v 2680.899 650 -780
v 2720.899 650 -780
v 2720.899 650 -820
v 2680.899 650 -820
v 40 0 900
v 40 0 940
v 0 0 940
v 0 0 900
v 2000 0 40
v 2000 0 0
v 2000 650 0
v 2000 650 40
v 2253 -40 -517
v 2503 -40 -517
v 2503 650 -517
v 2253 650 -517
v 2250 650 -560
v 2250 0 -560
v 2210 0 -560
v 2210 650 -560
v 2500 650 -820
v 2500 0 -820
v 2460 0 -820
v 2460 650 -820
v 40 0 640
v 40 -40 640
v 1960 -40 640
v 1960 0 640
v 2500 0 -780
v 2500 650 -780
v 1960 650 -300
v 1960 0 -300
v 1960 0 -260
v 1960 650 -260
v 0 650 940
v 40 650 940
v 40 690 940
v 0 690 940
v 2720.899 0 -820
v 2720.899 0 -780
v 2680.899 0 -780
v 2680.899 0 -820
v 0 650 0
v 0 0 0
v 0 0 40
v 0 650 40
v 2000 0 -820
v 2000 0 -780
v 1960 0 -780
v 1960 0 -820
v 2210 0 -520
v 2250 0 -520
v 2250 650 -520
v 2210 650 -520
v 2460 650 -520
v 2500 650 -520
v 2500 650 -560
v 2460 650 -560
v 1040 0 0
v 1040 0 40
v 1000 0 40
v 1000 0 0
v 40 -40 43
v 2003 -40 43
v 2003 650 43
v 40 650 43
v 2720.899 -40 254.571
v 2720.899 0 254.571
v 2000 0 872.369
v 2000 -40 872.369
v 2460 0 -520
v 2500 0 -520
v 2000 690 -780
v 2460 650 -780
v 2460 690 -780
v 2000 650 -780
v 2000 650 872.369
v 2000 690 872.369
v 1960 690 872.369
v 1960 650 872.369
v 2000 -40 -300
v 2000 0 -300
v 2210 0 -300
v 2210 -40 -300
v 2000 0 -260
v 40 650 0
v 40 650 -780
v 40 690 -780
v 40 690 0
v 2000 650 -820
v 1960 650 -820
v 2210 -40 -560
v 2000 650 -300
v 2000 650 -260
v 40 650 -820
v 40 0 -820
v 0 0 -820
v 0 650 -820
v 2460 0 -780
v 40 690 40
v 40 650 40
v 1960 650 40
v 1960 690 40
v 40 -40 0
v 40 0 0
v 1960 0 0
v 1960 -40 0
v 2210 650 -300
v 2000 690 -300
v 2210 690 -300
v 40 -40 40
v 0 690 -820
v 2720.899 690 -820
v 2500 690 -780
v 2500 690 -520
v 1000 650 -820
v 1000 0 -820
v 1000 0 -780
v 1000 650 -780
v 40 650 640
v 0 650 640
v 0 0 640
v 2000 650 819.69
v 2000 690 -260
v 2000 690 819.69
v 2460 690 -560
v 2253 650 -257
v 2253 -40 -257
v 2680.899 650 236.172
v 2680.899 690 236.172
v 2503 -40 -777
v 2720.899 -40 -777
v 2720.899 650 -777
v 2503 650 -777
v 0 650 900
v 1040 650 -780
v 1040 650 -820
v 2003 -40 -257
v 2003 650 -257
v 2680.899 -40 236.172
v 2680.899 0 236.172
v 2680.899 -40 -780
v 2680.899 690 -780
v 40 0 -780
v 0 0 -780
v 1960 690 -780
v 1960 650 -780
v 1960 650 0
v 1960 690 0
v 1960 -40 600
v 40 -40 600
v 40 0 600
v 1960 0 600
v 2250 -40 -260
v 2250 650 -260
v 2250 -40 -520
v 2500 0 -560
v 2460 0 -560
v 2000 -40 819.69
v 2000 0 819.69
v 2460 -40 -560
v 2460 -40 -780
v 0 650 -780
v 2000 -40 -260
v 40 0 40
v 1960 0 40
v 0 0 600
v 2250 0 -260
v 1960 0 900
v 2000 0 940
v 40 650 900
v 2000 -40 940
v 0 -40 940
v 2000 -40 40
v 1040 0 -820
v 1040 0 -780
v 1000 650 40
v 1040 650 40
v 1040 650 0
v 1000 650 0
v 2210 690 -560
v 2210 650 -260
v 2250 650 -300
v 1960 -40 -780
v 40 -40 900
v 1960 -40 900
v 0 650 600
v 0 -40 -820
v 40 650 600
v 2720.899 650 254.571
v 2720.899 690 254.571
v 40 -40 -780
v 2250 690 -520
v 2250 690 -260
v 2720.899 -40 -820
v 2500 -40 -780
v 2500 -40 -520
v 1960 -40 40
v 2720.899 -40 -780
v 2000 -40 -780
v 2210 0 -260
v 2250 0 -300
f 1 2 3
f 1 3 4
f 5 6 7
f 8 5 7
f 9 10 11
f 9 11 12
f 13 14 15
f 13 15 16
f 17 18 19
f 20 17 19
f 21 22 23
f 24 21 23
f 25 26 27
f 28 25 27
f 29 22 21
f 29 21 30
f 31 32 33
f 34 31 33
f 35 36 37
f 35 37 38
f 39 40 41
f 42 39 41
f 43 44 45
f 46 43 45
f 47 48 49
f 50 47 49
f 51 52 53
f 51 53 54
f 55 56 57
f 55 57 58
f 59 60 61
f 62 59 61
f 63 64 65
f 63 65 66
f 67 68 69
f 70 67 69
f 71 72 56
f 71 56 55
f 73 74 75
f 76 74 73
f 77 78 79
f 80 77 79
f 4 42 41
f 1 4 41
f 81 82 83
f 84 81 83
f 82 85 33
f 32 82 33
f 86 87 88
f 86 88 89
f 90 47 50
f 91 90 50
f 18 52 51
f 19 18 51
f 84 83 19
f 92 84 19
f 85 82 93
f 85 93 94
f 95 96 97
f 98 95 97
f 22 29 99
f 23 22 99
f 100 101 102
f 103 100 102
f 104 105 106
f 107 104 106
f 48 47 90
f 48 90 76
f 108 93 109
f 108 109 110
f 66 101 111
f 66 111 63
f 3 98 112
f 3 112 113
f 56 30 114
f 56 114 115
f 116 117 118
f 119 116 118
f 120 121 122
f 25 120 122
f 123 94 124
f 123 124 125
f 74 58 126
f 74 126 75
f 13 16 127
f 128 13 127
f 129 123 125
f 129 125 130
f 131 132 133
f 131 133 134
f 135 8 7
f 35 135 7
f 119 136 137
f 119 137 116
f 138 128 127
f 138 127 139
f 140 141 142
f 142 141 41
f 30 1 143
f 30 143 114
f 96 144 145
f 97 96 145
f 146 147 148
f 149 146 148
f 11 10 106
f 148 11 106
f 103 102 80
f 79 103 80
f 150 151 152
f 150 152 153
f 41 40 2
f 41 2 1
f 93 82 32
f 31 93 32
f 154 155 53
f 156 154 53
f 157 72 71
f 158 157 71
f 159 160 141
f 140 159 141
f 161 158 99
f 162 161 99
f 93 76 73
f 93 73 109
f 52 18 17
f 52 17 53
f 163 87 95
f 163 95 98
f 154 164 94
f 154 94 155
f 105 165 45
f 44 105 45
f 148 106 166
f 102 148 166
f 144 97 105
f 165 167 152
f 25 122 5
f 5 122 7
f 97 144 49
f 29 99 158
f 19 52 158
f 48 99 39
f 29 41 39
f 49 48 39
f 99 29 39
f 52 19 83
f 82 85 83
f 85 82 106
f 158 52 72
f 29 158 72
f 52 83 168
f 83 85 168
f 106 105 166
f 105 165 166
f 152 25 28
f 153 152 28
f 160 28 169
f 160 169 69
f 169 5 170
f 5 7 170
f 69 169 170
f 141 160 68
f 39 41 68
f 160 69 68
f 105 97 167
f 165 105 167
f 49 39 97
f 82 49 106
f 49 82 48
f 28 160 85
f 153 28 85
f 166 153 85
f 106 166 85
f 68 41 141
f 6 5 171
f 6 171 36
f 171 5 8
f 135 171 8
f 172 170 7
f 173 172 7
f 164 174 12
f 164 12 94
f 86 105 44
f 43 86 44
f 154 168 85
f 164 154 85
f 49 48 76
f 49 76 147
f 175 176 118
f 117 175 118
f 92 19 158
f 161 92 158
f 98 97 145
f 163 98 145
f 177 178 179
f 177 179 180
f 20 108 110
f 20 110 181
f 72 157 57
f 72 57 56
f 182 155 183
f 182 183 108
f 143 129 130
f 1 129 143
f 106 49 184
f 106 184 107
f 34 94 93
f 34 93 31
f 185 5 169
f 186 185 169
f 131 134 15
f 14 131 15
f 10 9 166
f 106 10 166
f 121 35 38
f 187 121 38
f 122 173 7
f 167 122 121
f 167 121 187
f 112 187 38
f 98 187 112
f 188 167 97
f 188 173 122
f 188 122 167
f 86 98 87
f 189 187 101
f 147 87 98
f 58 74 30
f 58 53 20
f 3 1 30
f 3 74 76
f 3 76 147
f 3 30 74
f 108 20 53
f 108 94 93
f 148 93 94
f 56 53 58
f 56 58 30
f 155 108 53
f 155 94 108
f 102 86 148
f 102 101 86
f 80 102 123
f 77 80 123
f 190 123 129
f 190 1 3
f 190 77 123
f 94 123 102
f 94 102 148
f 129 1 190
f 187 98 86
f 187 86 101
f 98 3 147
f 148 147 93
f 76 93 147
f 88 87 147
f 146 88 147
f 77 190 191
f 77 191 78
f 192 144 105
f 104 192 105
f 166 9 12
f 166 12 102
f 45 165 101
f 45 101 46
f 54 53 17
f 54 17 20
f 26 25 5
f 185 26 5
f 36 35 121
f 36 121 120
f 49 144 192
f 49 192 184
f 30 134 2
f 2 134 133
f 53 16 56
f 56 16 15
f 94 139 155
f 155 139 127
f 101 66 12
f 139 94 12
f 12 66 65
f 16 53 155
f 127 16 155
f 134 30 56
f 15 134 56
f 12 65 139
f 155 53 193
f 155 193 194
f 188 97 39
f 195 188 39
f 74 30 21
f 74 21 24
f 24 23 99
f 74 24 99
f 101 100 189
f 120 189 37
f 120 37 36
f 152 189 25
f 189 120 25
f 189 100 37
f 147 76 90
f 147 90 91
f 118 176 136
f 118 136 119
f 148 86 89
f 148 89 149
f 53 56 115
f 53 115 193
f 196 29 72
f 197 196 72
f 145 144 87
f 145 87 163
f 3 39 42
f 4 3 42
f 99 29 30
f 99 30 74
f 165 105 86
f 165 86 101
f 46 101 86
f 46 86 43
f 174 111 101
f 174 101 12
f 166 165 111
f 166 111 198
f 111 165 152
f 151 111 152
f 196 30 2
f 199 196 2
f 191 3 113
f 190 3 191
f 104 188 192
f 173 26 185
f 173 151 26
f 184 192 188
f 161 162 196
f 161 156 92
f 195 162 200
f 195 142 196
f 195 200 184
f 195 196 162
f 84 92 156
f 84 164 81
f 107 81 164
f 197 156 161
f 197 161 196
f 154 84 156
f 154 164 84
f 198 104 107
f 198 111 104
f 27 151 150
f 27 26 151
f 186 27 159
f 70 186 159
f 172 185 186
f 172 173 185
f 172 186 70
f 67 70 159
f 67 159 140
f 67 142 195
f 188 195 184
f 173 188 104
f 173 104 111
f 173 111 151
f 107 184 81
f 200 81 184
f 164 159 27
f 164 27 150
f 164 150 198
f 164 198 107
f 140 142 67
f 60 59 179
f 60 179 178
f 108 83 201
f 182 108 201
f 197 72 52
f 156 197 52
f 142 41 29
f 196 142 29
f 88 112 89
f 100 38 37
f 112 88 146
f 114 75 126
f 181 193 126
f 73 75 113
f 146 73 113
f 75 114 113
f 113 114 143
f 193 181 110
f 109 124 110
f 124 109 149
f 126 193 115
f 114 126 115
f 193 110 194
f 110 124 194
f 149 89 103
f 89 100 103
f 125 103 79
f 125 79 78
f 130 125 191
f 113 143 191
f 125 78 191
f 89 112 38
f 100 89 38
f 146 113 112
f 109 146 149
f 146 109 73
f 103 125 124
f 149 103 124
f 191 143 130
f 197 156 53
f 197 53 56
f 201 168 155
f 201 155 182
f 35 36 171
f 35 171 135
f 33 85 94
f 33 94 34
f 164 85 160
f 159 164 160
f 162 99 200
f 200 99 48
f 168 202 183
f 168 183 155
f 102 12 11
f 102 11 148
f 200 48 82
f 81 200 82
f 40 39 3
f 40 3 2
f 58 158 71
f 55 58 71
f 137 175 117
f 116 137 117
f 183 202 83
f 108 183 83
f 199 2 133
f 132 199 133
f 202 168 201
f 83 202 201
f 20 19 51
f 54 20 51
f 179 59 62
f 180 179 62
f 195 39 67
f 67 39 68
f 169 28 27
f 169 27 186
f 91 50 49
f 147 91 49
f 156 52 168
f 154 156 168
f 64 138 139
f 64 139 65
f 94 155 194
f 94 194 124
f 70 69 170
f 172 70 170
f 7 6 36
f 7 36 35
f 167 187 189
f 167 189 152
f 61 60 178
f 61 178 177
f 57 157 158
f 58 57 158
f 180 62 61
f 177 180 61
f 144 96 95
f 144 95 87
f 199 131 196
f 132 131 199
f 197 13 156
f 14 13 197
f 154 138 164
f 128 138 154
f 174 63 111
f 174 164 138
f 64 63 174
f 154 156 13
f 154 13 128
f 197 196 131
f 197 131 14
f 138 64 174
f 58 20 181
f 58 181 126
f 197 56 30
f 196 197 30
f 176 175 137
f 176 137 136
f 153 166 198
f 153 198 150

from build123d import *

# Parameters (mm, degrees)
F0_W      = 1920
F0_H      = 780
F0_H_2    = 860
F1_DEPTH  = 40
F2_W      = 40
F2_H      = 40
F3_DEPTH  = 650
F6_W      = 1920
F6_H      = 3
F6_W_2    = 40
F7_DEPTH  = 690
F9_DEPTH  = 760
F10_W     = 1920
F10_H     = 40
F11_DEPTH = 40
F12_W     = 664.210498333
F12_H     = 40
F13_DEPTH = 40


with BuildPart() as f1:
    # F0 (on Front) → F1 (new body)
    with BuildSketch(Plane.XZ):
        Polygon((0, -820), (2000, -820), (2720.8986186981, -820), (2720.8986186981, 254.5713696399), (2000, 872.3691137475), (2000, 940), (0, 940), (0, 40), (0, 0), align=None)
        with Locations((1000, -390)):
            Rectangle(F0_W, F0_H, mode=Mode.SUBTRACT)
        Polygon((2460, -780), (2000, -780), (2000, -300), (2210, -300), (2210, -560), (2460, -560), align=None, mode=Mode.SUBTRACT)
        Polygon((2000, 0), (2000, 40), (2000, 819.6901679039), (2680.8986186981, 236.1717373133), (2680.8986186981, -780), (2500, -780), (2500, -520), (2250, -520), (2250, -260), (2000, -260), align=None, mode=Mode.SUBTRACT)
        with Locations((1000, 470)):
            Rectangle(F0_W, F0_H_2, mode=Mode.SUBTRACT)
    extrude(amount=F1_DEPTH)


with BuildPart() as f3:
    # F2 (on face) → F3 (new body)
    with BuildSketch(Plane(origin=(0, 0, 0), x_dir=(-1, 0, 0), z_dir=(0, 1, 0))):
        with Locations((-20, 920)):
            Rectangle(F2_W, F2_H)
    extrude(amount=F3_DEPTH)


with BuildPart() as f3b:
    # F2 (on face) → F3, piece 2 (new body)
    with BuildSketch(Plane(origin=(0, 0, 0), x_dir=(-1, 0, 0), z_dir=(0, 1, 0))):
        with Locations((-20, 20)):
            Rectangle(F2_W, F2_H)
    extrude(amount=F3_DEPTH)


with BuildPart() as f3c:
    # F2 (on face) → F3, piece 3 (new body)
    with BuildSketch(Plane(origin=(0, 0, 0), x_dir=(-1, 0, 0), z_dir=(0, 1, 0))):
        with Locations((-20, -800)):
            Rectangle(F2_W, F2_H)
    extrude(amount=F3_DEPTH)


with BuildPart() as f3d:
    # F2 (on face) → F3, piece 4 (new body)
    with BuildSketch(Plane(origin=(0, 0, 0), x_dir=(-1, 0, 0), z_dir=(0, 1, 0))):
        with Locations((-1020, -800)):
            Rectangle(F2_W, F2_H)
    extrude(amount=F3_DEPTH)


with BuildPart() as f3e:
    # F2 (on face) → F3, piece 5 (new body)
    with BuildSketch(Plane(origin=(0, 0, 0), x_dir=(-1, 0, 0), z_dir=(0, 1, 0))):
        with Locations((-1020, 20)):
            Rectangle(F2_W, F2_H)
    extrude(amount=F3_DEPTH)


with BuildPart() as f3f:
    # F2 (on face) → F3, piece 6 (new body)
    with BuildSketch(Plane(origin=(0, 0, 0), x_dir=(-1, 0, 0), z_dir=(0, 1, 0))):
        with Locations((-1980, 20)):
            Rectangle(F2_W, F2_H)
    extrude(amount=F3_DEPTH)


with BuildPart() as f3g:
    # F2 (on face) → F3, piece 7 (new body)
    with BuildSketch(Plane(origin=(0, 0, 0), x_dir=(-1, 0, 0), z_dir=(0, 1, 0))):
        with Locations((-1980, -800)):
            Rectangle(F2_W, F2_H)
    extrude(amount=F3_DEPTH)


with BuildPart() as f3h:
    # F2 (on face) → F3, piece 8 (new body)
    with BuildSketch(Plane(origin=(0, 0, 0), x_dir=(-1, 0, 0), z_dir=(0, 1, 0))):
        with Locations((-1980, -280)):
            Rectangle(F2_W, F2_H)
    extrude(amount=F3_DEPTH)


with BuildPart() as f3i:
    # F2 (on face) → F3, piece 9 (new body)
    with BuildSketch(Plane(origin=(0, 0, 0), x_dir=(-1, 0, 0), z_dir=(0, 1, 0))):
        with Locations((-2230, -280)):
            Rectangle(F2_W, F2_H)
    extrude(amount=F3_DEPTH)


with BuildPart() as f3j:
    # F2 (on face) → F3, piece 10 (new body)
    with BuildSketch(Plane(origin=(0, 0, 0), x_dir=(-1, 0, 0), z_dir=(0, 1, 0))):
        with Locations((-2480, -540)):
            Rectangle(F2_W, F2_H)
    extrude(amount=F3_DEPTH)


with BuildPart() as f3k:
    # F2 (on face) → F3, piece 11 (new body)
    with BuildSketch(Plane(origin=(0, 0, 0), x_dir=(-1, 0, 0), z_dir=(0, 1, 0))):
        with Locations((-2230, -540)):
            Rectangle(F2_W, F2_H)
    extrude(amount=F3_DEPTH)


with BuildPart() as f3l:
    # F2 (on face) → F3, piece 12 (new body)
    with BuildSketch(Plane(origin=(0, 0, 0), x_dir=(-1, 0, 0), z_dir=(0, 1, 0))):
        with Locations((-2480, -800)):
            Rectangle(F2_W, F2_H)
    extrude(amount=F3_DEPTH)


with BuildPart() as f3m:
    # F2 (on face) → F3, piece 13 (new body)
    with BuildSketch(Plane(origin=(0, 0, 0), x_dir=(-1, 0, 0), z_dir=(0, 1, 0))):
        with Locations((-2700.8986186981, -800)):
            Rectangle(F2_W, F2_H)
    extrude(amount=F3_DEPTH)


with BuildPart() as f5_1:
    # F5: instance of F1
    add(f1.part.mirror(Plane(origin=(1405.4269340263, 325, -25.6106012705), x_dir=(1, 0, 0), z_dir=(0, 1, 0))))

    # F8 (on face) → F9 (cut)
    with BuildSketch(Plane(origin=(0, 690, 0), x_dir=(-1, 0, 0), z_dir=(0, 1, 0))):
        Polygon((-40, 940), (-2000, 940), (-2000, 872.3691137475), (-1960, 872.3691137475), (-1960, 900), (-40, 900), align=None)
    extrude(amount=-F9_DEPTH, mode=Mode.SUBTRACT)


with BuildPart() as f7:
    # F6 (on face) → F7 (new body)
    with BuildSketch(Plane.XZ.offset(40)):
        with Locations((1000, 41.5)):
            Rectangle(F6_W, F6_H)
        with Locations((1980, 41.5)):
            Rectangle(F6_W_2, F6_H)
        Polygon((2000, 43), (2000, 40), (2000, -260), (2250, -260), (2250, -520), (2500, -520), (2500, -780), (2680.8986186981, -780), (2680.8986186981, -777), (2503, -777), (2503, -517), (2253, -517), (2253, -257), (2003, -257), (2003, 43), align=None)
        with Locations((2700.8986186981, -778.5)):
            Rectangle(F6_W_2, F6_H)
    extrude(amount=-F7_DEPTH)


with BuildPart() as f1_1:
    add(f1.part)

    # F10 (on face) → F11 (join)
    with BuildSketch(Plane.XZ.offset(40)):
        with Locations((1000, 620)):
            Rectangle(F10_W, F10_H)
    extrude(amount=-F11_DEPTH)

    add(f5_1.part)  # F13 merges F5_1
    # F12 (on face) → F13 (join)
    with BuildSketch(Plane(origin=(0, 0, 0), x_dir=(0, -1, 0), z_dir=(-1, 0, 0))):
        with Locations((-332.1052491665, 620)):
            Rectangle(F12_W, F12_H)
    extrude(amount=-F13_DEPTH)


solid = Compound([f3.part, f3b.part, f3c.part, f3d.part, f3e.part, f3f.part, f3g.part, f3h.part, f3i.part, f3j.part, f3k.part, f3l.part, f3m.part, f7.part, f1_1.part])
